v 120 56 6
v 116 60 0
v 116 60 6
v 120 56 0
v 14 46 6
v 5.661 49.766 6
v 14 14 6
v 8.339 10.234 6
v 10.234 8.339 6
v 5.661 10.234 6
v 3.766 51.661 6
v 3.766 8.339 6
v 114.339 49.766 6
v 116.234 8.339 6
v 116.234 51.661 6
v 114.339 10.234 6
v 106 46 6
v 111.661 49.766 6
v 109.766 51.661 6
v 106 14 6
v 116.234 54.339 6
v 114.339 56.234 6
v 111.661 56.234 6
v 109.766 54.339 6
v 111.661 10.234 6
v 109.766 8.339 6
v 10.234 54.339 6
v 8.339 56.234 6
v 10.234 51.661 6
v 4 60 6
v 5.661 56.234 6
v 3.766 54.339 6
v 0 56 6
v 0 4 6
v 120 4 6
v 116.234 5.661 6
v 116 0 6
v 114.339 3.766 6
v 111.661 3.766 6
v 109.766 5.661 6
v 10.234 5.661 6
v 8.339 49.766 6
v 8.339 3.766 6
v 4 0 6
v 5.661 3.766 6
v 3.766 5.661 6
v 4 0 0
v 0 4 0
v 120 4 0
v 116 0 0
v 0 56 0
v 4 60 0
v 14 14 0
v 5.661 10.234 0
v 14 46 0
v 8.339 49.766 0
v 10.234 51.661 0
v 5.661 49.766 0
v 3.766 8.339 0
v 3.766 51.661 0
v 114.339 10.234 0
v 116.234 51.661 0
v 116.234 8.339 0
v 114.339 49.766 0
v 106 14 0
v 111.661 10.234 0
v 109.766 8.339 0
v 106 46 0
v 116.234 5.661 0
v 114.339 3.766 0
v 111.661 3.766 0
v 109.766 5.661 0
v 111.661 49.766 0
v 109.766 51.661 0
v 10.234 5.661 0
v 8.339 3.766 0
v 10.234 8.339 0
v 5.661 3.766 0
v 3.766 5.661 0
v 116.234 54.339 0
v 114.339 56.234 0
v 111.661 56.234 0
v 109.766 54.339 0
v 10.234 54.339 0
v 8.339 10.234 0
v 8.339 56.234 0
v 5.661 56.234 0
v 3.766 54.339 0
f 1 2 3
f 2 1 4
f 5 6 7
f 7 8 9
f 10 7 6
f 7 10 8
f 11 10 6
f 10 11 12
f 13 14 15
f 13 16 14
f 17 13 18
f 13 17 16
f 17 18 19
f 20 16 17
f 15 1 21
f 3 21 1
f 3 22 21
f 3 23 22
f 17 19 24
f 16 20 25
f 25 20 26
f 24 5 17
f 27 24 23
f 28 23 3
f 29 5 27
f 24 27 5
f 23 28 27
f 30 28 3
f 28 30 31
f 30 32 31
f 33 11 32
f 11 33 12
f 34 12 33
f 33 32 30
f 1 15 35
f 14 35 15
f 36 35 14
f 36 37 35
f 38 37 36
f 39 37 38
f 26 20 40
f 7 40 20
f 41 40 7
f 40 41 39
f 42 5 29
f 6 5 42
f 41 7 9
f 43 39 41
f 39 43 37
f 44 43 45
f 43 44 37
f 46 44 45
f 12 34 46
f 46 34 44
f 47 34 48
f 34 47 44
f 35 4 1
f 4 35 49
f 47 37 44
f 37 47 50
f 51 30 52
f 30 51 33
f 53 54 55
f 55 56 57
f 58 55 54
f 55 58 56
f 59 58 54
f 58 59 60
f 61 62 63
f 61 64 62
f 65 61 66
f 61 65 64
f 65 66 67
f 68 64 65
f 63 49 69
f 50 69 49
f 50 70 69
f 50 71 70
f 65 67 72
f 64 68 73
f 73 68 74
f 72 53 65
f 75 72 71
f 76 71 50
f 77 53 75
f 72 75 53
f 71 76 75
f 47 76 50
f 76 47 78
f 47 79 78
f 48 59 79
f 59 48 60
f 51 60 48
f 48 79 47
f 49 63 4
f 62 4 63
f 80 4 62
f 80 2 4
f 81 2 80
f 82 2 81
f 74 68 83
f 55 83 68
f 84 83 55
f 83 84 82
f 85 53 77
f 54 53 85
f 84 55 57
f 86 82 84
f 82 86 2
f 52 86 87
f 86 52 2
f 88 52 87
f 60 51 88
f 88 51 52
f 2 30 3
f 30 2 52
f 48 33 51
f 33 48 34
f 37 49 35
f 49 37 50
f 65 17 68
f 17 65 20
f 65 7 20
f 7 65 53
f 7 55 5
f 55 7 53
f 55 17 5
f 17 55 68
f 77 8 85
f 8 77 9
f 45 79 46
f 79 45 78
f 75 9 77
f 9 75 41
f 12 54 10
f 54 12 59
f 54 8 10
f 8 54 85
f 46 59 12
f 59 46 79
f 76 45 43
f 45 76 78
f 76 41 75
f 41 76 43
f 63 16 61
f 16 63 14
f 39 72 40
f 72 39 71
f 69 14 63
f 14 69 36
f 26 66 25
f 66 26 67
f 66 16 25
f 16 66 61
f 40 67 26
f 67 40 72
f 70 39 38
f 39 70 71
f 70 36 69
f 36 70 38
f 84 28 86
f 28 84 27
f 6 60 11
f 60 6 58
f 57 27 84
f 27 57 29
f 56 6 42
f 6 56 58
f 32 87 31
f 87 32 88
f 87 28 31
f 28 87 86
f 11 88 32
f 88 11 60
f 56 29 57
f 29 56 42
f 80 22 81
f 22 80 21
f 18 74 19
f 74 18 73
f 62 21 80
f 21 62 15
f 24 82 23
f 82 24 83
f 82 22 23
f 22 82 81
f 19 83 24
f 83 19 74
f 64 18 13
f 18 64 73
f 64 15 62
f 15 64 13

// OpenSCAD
$fn = 32;

// ----------------------------------------------------------------------
// Frame plate: 120 x 60 frame, 14 mm rails
// ----------------------------------------------------------------------

// --- parameters (mm) ---
plate_l = 120;            // plate length, X
plate_w = 60;             // plate width, Y
plate_t = 6;              // plate thickness, Z (extrusion height)
corner_c = 4;             // corner chamfer
frame_bar = 14;           // frame rail width
bolt_r = 3.5;             // corner bolt window radius
bolt_inset = 7;           // bolt centre inset from the edges

win_l = plate_l - 2 * frame_bar;  // window length
win_w = plate_w - 2 * frame_bar;  // window width
bolt_d = 2 * bolt_r;  // corner hole diameter

profile = [[4, 0], [116, 0], [120, 4], [120, 56], [116, 60], [4, 60], [0, 56], [0, 4]];  // primary outline, 8 points, counter clockwise
void_1 = [[14, 14], [106, 14], [106, 46], [14, 46]];  // the window, 4 points
void_2 = [[10.234, 8.339], [8.339, 10.234], [5.661, 10.234], [3.766, 8.339], [3.766, 5.661], [5.661, 3.766], [8.339, 3.766], [10.234, 5.661]];  // corner bolt window, 8 points
void_3 = [[116.234, 8.339], [114.339, 10.234], [111.661, 10.234], [109.766, 8.339], [109.766, 5.661], [111.661, 3.766], [114.339, 3.766], [116.234, 5.661]];  // corner bolt window, 8 points
void_4 = [[10.234, 54.339], [8.339, 56.234], [5.661, 56.234], [3.766, 54.339], [3.766, 51.661], [5.661, 49.766], [8.339, 49.766], [10.234, 51.661]];  // corner bolt window, 8 points
void_5 = [[116.234, 54.339], [114.339, 56.234], [111.661, 56.234], [109.766, 54.339], [109.766, 51.661], [111.661, 49.766], [114.339, 49.766], [116.234, 51.661]];  // corner bolt window, 8 points

// --- the one profile operation ---
difference() {
  linear_extrude(height = plate_t) polygon(points = profile);
  translate([0, 0, -1])
    linear_extrude(height = plate_t + 2) polygon(points = void_1);
  translate([0, 0, -1])
    linear_extrude(height = plate_t + 2) polygon(points = void_2);
  translate([0, 0, -1])
    linear_extrude(height = plate_t + 2) polygon(points = void_3);
  translate([0, 0, -1])
    linear_extrude(height = plate_t + 2) polygon(points = void_4);
  translate([0, 0, -1])
    linear_extrude(height = plate_t + 2) polygon(points = void_5);
}
